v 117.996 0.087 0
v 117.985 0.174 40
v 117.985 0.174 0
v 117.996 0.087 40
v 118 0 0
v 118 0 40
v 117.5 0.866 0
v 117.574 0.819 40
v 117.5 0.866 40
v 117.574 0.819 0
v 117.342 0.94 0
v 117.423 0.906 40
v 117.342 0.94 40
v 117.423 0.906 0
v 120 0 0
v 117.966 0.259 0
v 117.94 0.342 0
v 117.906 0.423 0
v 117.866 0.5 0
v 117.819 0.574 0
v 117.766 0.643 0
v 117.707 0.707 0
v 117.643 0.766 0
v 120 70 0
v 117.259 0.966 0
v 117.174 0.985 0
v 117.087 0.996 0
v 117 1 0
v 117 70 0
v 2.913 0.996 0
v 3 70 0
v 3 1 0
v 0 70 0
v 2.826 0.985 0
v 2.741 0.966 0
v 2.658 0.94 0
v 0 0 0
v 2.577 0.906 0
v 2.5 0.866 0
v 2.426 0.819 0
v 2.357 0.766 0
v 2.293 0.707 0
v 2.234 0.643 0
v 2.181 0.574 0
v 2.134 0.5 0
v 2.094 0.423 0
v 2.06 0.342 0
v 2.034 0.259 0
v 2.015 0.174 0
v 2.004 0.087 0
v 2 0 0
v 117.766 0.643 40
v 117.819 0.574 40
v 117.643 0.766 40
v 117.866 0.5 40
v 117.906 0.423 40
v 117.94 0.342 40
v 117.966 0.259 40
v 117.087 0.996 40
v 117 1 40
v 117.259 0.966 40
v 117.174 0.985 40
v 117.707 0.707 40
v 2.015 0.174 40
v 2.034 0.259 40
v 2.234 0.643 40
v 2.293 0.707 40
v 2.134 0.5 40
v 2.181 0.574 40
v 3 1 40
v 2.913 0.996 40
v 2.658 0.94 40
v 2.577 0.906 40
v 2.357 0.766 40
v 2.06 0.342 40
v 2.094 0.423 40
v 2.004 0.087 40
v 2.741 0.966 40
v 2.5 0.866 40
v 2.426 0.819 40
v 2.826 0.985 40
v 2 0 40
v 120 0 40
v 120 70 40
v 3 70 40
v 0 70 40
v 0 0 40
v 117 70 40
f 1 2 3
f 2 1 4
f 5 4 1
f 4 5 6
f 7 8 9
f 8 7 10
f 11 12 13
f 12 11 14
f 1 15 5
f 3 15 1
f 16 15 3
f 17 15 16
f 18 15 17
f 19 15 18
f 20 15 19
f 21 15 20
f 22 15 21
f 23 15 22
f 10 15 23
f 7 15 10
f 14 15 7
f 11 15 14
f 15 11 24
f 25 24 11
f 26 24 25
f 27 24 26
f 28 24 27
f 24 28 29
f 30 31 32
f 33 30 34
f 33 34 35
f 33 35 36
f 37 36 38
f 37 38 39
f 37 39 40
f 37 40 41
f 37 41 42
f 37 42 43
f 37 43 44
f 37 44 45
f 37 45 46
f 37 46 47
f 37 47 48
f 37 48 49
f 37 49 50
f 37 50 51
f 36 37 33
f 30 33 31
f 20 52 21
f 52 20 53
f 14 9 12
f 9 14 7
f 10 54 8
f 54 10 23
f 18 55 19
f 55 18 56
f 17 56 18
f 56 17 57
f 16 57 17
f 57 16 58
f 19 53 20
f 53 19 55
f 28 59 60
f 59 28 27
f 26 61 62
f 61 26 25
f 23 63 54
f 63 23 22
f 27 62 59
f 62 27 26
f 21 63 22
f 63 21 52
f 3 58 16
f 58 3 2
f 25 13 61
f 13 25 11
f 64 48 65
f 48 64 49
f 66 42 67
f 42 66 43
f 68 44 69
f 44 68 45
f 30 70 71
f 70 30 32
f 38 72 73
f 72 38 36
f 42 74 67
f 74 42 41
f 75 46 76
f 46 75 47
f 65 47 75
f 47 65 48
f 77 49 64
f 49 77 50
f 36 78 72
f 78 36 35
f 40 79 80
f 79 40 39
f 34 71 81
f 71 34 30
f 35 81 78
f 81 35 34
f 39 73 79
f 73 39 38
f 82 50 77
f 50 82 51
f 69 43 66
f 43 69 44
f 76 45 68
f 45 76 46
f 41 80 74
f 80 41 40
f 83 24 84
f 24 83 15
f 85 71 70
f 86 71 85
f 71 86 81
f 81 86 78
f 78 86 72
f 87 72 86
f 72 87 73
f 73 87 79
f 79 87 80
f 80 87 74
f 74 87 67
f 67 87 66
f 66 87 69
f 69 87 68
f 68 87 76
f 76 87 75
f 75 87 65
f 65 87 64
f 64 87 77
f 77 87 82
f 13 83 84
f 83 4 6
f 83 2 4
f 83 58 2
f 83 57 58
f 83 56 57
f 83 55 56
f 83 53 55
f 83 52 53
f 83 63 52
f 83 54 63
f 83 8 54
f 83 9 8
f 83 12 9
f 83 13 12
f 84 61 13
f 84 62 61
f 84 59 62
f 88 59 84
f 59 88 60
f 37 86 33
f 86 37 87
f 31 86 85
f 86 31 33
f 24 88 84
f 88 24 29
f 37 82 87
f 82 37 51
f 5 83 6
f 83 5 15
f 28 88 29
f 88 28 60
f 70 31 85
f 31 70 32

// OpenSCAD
// Buffer tank for a mini horizontal gel-electrophoresis box. Open-top rectangular tank with a
// solid raised platform for the gel tray that divides the bottom into two buffer chambers. Each
// end wall gets a horizontal 2 mm hole along X at y = 0, z = 30 for the electrode wires.
//

X  = 120;
Y  = 70;
Z  = 40;
w  = 3;
floor = 3;
platform_L = 60;
platform_h = 10;

$fn = 64;

inner_X = X - 2 * w;
inner_Z = Z - floor;

difference() {
    cube([X, Y, Z]);
    translate([w, 0, floor]) cube([inner_X, Y, inner_Z]);     // hollow out the volume above the floor
    translate([w, 0, 0]) cube([inner_X, Y, w]);                 // remove the top layer so the tank is open

    // raised platform for the gel tray: full width (Y), length platform_L centred in X, top at
    // z = floor + platform_h
    translate([X / 2 - platform_L / 2, 0, floor])
        cube([platform_L, Y, platform_h]);

    // electrode holes: a 2 mm diameter horizontal hole along X at y = 0, z = 30 in each end wall
    for (x = [X - w, w]) {
        translate([x, 0, 0])
            cylinder(h = X, d = 2, $fn = 72);                  // horizontal through the X length of the wall
    }
}
